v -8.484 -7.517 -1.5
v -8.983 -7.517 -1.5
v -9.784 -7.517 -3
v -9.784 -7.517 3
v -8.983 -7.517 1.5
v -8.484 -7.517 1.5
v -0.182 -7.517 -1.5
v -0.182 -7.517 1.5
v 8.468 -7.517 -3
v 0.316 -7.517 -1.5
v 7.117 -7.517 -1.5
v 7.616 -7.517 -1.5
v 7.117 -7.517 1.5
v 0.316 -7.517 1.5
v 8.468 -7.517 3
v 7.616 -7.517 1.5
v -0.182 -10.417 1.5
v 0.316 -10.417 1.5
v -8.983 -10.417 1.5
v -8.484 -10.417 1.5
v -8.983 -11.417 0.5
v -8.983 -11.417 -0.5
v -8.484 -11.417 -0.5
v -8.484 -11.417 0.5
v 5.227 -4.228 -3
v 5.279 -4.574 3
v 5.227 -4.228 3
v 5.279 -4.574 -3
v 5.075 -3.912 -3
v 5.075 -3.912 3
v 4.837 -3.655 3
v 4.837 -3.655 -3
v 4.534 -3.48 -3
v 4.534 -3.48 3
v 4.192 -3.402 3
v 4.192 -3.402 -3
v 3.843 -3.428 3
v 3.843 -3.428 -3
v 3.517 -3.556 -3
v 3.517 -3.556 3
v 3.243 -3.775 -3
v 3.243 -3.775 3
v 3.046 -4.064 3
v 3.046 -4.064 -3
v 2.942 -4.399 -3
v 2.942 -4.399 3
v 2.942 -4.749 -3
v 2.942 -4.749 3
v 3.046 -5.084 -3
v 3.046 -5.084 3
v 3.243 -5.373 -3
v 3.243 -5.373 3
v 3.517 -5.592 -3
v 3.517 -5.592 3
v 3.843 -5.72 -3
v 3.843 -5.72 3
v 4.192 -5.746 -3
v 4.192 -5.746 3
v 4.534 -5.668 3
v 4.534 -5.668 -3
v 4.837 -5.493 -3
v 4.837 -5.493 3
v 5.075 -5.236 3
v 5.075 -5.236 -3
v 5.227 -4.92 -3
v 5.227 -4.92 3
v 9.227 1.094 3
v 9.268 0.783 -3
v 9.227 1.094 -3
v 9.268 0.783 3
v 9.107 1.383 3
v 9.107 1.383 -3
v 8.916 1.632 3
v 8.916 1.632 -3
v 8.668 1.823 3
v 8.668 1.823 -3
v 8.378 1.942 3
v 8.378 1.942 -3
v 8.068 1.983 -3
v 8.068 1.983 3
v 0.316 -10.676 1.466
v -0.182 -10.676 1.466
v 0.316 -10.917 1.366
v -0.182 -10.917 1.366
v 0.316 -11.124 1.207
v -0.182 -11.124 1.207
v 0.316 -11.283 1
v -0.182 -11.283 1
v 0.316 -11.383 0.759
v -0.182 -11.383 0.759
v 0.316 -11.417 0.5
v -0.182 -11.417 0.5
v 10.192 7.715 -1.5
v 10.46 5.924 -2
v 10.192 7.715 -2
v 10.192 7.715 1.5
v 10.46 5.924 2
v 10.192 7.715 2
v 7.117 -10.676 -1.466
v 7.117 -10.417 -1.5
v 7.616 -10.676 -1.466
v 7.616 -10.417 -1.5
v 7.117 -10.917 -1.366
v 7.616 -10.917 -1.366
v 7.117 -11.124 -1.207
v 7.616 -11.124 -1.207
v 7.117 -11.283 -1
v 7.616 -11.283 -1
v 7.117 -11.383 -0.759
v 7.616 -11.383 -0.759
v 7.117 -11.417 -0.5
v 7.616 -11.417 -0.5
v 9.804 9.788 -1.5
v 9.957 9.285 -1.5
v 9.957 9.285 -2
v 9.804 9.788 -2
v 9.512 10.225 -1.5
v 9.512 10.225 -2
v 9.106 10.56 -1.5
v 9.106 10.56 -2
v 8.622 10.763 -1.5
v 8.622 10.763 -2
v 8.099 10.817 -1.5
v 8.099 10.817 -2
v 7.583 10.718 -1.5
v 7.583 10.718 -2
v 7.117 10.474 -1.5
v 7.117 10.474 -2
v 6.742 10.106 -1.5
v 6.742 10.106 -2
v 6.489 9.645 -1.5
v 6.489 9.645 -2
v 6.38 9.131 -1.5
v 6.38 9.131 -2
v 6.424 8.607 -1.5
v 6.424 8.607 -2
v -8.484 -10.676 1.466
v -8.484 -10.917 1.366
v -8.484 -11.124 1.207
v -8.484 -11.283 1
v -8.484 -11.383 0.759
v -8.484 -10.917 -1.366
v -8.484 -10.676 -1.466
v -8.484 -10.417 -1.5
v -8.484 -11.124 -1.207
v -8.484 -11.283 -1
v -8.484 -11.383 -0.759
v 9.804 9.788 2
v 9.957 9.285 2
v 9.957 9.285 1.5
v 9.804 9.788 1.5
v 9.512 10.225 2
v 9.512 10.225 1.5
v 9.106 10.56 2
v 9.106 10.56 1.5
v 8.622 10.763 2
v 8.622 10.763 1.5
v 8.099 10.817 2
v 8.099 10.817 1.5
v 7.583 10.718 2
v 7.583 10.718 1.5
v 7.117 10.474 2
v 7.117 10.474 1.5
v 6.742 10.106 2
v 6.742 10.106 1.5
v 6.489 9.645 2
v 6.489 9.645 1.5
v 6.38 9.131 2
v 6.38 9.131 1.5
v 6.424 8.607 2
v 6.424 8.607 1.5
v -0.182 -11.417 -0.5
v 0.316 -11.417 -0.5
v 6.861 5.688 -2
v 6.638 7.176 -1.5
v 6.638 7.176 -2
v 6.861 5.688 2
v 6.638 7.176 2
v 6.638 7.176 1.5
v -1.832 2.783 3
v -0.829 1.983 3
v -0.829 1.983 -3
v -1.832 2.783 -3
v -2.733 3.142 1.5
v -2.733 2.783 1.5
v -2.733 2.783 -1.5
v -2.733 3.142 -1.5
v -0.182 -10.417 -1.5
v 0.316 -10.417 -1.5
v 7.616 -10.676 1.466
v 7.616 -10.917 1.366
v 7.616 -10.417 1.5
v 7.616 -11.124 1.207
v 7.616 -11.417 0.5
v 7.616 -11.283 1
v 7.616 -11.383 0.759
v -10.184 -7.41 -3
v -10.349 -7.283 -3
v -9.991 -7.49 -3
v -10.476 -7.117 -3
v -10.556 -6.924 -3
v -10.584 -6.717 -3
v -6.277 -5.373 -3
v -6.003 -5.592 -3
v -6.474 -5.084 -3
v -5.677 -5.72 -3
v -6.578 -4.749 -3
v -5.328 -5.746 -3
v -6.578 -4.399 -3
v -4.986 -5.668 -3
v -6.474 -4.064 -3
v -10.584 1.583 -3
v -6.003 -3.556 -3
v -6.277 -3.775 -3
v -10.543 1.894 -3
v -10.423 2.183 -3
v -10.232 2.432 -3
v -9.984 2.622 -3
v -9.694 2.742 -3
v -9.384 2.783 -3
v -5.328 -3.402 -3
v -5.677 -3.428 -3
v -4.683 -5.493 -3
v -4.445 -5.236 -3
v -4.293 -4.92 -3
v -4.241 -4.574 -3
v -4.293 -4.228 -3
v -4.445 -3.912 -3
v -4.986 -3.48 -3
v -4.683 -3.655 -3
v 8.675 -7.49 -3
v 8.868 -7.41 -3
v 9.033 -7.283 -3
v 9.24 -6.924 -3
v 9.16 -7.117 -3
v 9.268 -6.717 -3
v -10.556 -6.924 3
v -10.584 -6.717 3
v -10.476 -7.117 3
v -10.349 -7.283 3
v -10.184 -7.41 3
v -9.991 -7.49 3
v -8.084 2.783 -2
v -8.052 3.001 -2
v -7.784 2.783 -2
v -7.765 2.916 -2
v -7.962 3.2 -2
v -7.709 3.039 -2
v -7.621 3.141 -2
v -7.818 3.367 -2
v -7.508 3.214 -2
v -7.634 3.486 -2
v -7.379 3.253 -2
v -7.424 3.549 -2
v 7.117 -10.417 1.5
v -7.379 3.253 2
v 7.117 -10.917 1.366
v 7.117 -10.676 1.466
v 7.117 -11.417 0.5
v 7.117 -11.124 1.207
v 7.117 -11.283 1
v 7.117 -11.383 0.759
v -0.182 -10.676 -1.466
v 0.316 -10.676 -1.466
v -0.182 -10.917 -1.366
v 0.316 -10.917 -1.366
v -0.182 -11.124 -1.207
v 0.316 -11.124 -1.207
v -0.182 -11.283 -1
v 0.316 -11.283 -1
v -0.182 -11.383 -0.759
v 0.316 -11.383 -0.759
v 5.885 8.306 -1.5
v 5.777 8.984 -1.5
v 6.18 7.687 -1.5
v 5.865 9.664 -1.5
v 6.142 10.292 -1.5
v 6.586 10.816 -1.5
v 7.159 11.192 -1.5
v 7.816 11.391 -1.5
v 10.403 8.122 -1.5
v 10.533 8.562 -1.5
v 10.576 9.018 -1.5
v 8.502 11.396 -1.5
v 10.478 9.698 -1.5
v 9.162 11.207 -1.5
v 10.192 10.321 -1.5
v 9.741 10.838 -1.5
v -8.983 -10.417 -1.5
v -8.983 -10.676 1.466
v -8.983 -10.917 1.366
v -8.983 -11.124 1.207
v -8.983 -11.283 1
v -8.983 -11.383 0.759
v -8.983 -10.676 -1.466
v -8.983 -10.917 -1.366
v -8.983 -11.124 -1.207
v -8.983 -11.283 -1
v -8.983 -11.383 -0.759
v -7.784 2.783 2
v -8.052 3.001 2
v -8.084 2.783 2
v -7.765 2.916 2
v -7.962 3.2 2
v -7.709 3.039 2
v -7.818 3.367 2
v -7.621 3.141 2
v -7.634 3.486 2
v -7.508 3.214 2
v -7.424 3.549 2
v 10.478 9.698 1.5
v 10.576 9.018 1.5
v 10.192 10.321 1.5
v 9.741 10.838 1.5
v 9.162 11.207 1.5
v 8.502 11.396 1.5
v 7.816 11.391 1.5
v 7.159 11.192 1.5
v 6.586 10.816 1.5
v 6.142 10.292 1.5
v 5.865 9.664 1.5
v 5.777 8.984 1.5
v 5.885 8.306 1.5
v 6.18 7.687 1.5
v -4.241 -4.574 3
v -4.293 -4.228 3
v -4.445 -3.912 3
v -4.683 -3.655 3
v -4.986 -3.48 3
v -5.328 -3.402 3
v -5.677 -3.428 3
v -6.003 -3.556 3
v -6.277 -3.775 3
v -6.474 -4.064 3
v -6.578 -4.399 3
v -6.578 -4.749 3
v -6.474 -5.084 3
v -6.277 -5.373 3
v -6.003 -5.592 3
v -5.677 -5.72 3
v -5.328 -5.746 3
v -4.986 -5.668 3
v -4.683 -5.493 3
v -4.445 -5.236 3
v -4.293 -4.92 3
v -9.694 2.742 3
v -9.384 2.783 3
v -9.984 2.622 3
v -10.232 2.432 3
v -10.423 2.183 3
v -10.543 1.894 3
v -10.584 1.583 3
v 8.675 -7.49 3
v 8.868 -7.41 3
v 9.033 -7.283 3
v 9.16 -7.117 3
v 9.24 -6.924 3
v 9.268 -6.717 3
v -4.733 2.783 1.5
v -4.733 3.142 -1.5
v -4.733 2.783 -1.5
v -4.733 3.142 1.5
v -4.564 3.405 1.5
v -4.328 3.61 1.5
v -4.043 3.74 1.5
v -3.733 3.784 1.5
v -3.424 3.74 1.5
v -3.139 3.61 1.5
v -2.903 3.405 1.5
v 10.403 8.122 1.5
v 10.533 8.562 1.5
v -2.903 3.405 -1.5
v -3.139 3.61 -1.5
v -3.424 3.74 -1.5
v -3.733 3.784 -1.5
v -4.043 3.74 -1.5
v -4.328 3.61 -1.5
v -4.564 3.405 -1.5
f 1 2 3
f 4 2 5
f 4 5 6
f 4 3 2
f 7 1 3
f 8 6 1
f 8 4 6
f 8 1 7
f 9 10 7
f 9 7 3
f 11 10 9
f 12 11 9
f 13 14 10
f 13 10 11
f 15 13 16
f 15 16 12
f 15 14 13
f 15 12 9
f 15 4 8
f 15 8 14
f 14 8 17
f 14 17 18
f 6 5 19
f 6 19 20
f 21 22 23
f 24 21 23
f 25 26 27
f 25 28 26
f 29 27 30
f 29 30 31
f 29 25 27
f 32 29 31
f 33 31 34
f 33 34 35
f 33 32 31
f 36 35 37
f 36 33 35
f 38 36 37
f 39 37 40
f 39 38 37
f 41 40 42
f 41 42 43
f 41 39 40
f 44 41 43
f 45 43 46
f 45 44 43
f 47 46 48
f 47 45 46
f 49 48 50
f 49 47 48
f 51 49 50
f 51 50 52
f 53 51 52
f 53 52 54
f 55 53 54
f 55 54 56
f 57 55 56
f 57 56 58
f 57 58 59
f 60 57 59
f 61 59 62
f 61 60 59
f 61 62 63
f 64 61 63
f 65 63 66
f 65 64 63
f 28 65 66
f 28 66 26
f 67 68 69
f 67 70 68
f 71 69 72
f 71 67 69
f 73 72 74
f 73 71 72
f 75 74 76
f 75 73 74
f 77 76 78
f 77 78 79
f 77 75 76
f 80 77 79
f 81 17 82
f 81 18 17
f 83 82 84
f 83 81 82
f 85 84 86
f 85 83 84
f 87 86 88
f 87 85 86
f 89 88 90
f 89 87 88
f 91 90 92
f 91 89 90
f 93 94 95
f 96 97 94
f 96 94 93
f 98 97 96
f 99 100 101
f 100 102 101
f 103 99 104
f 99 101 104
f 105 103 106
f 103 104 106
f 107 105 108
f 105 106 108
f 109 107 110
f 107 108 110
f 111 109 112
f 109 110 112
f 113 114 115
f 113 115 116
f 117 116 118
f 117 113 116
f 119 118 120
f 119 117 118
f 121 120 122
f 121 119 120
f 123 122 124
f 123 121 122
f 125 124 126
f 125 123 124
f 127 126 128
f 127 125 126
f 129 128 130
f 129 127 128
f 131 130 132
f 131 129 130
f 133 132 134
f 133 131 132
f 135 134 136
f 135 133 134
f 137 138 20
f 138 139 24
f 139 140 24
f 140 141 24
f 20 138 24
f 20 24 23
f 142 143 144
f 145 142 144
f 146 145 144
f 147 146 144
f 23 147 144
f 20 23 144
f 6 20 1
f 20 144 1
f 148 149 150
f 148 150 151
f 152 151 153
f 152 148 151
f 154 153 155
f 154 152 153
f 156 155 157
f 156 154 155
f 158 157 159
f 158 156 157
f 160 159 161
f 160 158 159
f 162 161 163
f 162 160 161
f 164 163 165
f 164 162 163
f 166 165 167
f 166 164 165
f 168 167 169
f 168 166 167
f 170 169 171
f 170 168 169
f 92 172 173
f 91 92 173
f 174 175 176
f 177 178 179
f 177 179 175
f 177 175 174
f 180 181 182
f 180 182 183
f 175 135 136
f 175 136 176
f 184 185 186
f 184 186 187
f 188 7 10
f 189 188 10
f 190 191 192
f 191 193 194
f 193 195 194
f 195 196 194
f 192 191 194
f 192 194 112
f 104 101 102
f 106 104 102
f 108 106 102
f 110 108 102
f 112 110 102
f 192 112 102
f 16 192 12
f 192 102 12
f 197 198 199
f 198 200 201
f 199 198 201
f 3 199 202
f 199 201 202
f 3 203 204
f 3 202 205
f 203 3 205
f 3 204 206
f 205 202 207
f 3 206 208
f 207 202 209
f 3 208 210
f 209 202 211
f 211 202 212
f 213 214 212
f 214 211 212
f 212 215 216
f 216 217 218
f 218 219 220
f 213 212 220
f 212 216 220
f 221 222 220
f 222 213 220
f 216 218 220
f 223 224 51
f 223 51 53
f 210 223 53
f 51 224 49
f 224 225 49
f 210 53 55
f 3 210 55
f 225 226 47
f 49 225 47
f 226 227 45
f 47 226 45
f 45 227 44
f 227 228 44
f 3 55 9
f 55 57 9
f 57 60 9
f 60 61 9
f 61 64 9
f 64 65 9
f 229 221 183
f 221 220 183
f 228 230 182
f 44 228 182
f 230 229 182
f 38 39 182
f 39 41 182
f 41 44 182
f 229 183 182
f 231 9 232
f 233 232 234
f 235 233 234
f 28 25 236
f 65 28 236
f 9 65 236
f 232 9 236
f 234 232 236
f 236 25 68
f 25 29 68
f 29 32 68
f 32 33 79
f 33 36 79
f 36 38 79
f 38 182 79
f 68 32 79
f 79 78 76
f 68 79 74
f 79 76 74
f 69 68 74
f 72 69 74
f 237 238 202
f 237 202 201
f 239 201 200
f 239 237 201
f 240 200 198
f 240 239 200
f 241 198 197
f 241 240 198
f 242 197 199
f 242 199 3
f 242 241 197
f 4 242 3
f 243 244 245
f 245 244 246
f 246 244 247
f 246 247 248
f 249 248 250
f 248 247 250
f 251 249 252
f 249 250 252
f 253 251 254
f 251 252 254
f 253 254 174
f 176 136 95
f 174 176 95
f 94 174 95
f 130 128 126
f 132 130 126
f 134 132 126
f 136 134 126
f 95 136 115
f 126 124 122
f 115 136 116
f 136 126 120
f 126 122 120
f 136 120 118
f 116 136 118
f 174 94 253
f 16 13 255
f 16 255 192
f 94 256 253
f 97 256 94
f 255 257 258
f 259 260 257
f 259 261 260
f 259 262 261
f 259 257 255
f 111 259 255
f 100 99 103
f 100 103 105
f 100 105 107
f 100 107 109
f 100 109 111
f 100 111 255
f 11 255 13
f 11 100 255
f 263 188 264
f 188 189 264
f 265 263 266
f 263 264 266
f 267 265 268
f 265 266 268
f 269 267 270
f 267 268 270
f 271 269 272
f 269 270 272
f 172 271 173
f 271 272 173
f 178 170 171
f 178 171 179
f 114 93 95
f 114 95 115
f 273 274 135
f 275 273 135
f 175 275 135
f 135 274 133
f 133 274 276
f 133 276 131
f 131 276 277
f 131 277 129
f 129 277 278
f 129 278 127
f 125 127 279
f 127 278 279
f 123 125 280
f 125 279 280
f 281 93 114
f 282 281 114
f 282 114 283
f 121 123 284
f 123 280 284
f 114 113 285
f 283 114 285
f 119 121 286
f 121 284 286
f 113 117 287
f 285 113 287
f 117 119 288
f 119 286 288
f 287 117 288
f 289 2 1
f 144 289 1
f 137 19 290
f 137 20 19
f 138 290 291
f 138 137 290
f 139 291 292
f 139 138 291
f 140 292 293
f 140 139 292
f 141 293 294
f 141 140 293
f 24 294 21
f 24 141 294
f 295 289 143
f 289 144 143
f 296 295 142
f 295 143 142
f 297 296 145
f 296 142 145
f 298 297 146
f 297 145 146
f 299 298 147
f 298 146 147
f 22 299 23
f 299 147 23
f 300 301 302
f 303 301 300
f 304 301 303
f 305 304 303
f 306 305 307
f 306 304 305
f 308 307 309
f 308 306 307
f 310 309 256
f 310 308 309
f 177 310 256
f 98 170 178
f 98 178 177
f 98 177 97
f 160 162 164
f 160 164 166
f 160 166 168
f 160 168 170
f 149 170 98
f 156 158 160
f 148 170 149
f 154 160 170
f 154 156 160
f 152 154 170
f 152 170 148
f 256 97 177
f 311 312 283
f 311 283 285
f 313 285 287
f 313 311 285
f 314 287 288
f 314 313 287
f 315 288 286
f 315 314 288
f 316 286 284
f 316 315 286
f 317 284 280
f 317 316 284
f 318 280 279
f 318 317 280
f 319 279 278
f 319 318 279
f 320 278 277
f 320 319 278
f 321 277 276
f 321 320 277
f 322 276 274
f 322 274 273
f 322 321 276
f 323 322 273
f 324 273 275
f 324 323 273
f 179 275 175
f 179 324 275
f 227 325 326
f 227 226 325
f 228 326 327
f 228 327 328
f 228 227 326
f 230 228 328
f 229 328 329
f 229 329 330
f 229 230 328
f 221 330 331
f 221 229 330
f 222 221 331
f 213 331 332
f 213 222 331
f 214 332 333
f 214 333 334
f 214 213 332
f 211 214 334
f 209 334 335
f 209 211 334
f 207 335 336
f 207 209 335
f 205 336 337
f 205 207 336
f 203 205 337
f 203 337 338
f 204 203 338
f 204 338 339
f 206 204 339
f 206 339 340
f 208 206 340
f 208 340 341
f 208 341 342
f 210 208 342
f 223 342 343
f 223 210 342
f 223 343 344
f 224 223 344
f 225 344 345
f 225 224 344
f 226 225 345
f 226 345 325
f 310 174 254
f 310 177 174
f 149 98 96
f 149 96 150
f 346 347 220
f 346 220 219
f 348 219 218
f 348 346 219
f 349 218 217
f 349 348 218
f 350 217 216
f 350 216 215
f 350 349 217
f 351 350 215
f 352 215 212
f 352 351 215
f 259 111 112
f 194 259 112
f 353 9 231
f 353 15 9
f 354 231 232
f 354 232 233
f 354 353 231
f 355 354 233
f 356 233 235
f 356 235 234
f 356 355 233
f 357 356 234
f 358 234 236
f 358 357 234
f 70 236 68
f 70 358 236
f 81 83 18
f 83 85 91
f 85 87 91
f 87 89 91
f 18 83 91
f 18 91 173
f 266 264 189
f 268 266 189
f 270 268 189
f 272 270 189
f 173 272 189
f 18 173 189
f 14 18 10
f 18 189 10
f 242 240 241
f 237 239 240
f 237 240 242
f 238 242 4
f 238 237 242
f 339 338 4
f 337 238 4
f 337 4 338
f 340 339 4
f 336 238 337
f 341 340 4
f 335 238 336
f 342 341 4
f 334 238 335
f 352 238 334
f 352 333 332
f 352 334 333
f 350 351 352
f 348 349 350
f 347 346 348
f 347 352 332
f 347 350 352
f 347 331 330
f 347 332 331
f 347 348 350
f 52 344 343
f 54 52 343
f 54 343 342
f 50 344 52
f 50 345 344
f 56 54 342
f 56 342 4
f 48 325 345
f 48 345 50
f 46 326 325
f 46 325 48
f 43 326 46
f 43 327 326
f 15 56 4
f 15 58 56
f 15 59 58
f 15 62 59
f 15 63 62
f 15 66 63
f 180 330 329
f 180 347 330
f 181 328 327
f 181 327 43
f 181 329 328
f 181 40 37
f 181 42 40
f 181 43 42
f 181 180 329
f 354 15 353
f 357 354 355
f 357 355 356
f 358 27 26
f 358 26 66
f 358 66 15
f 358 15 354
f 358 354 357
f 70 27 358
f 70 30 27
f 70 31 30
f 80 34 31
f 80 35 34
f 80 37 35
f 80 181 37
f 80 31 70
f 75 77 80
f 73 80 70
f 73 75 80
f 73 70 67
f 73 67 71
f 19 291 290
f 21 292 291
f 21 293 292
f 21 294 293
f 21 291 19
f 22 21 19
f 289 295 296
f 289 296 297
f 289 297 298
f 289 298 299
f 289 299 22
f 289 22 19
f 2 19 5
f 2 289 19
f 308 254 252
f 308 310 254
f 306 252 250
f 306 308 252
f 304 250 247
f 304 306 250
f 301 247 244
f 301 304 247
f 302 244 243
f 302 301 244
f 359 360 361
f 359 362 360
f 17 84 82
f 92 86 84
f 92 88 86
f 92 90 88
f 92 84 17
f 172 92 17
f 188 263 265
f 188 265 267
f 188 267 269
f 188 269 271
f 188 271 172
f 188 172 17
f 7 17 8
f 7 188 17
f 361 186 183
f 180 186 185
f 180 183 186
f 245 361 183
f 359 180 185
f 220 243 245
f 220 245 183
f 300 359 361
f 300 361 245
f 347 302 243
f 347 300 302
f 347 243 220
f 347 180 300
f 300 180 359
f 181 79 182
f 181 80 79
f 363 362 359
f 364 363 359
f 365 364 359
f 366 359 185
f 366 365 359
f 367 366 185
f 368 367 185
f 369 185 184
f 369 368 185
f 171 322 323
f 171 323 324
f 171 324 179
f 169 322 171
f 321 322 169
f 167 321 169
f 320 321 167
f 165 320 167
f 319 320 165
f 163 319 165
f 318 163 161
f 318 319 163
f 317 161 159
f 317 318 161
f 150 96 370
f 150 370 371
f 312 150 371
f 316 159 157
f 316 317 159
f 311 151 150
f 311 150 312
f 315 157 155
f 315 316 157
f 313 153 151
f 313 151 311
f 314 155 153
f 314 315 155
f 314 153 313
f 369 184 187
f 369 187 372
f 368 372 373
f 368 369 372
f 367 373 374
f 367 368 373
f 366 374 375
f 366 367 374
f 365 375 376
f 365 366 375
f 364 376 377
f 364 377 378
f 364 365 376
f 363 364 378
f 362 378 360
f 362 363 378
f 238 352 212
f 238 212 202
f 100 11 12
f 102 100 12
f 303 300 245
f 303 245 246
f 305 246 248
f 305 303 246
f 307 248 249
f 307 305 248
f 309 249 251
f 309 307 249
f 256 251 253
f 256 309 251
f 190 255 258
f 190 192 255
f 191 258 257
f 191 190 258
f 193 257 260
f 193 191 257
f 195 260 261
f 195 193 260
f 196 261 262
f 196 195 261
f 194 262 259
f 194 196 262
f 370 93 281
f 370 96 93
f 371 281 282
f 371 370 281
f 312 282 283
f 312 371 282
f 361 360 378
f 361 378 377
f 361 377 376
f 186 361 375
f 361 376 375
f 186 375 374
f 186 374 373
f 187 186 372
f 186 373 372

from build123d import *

# Parameters (mm, degrees)
F0_R     = 1.486134
F1_DEPTH = 1.5
F2_DEPTH = 2
F0_R_2   = 1.175
F3_DEPTH = 3
F0_W     = 0.498902
F0_H     = 3.899722
F0_W_2   = 0.498903
F4_DEPTH = 1.5
F5_R     = 1


with BuildPart() as f1:
    # F0 (on Top) → F1 (new body, symmetric)
    with BuildSketch(Plane.XY):
        with BuildLine():
            Line((9.956507, 9.285055), (10.191603, 7.715109))
            ThreePointArc((10.191603, 7.715109), (10.478158, 8.338993), (10.576356, 9.018481))
            ThreePointArc((10.576356, 9.018481), (7.15933, 11.192339), (6.638307, 7.17609))
            Line((6.638307, 7.17609), (6.424053, 8.606856))
            ThreePointArc((6.424053, 8.606856), (7.83697, 10.786197), (9.956507, 9.285055))
        make_face()
        with BuildLine():
            ThreePointArc((6.638307, 7.17609), (8.536307, 6.645627), (10.191603, 7.715109))
            Line((10.191603, 7.715109), (9.956507, 9.285055))
            ThreePointArc((9.956507, 9.285055), (7.83697, 10.786197), (6.424053, 8.606856))
            Line((6.424053, 8.606856), (6.638307, 7.17609))
        make_face()
        with Locations((8.176356, 9.018481)):
            Circle(F0_R, mode=Mode.SUBTRACT)
    extrude(amount=F1_DEPTH, both=True)

    # F0 (on Top) → F2 (join, symmetric)
    with BuildSketch(Plane.XY):
        with BuildLine():
            Line((-8.083594, 2.783208), (-7.783598, 2.783208))
            ThreePointArc((-7.783598, 2.783208), (-7.668552, 3.092999), (-7.379205, 3.252638))
            Line((-7.379205, 3.252638), (10.459818, 5.923991))
            Line((10.459818, 5.923991), (10.191603, 7.715109))
            ThreePointArc((10.191603, 7.715109), (8.536307, 6.645627), (6.638307, 7.17609))
            Line((6.638307, 7.17609), (6.861082, 5.688423))
            Line((6.861082, 5.688423), (-7.423694, 3.549311))
            ThreePointArc((-7.423694, 3.549311), (-7.895881, 3.288779), (-8.083594, 2.783208))
        make_face()
        with BuildLine():
            ThreePointArc((6.638307, 7.17609), (8.536307, 6.645627), (10.191603, 7.715109))
            Line((10.191603, 7.715109), (9.956507, 9.285055))
            ThreePointArc((9.956507, 9.285055), (7.83697, 10.786197), (6.424053, 8.606856))
            Line((6.424053, 8.606856), (6.638307, 7.17609))
        make_face()
        with Locations((8.176356, 9.018481)):
            Circle(F0_R, mode=Mode.SUBTRACT)
        with Locations((8.176356, 9.018481)):
            Circle(F0_R)
    extrude(amount=F2_DEPTH, both=True)

    # F0 (on Top) → F3 (join, symmetric)
    with BuildSketch(Plane.XY):
        with BuildLine():
            Line((8.067619, 1.983345), (-0.828579, 1.983345))
            Line((-0.828579, 1.983345), (-1.832268, 2.783208))
            Line((-1.832268, 2.783208), (-2.733431, 2.783208))
            Line((-2.733431, 2.783208), (-4.733298, 2.783208))
            Line((-4.733298, 2.783208), (-7.783598, 2.783208))
            Line((-7.783598, 2.783208), (-8.083594, 2.783208))
            Line((-8.083594, 2.783208), (-9.383528, 2.783208))
            ThreePointArc((-9.383528, 2.783208), (-10.232056, 2.431737), (-10.583528, 1.583208))
            Line((-10.583528, 1.583208), (-10.583528, -6.717112))
            ThreePointArc((-10.583528, -6.717112), (-10.349214, -7.282798), (-9.783528, -7.517112))
            Line((-9.783528, -7.517112), (-8.983085, -7.517112))
            Line((-8.983085, -7.517112), (-8.484182, -7.517112))
            Line((-8.484182, -7.517112), (-0.182472, -7.517112))
            Line((-0.182472, -7.517112), (0.316431, -7.517112))
            Line((0.316431, -7.517112), (7.116681, -7.517112))
            Line((7.116681, -7.517112), (7.615583, -7.517112))
            Line((7.615583, -7.517112), (8.467619, -7.517112))
            ThreePointArc((8.467619, -7.517112), (9.033304, -7.282798), (9.267619, -6.717112))
            Line((9.267619, -6.717112), (9.267619, 0.783345))
            ThreePointArc((9.267619, 0.783345), (8.916147, 1.631874), (8.067619, 1.983345))
        make_face()
        with Locations((-5.415644, -4.574013)):
            Circle(F0_R_2, mode=Mode.SUBTRACT)
        with Locations((4.104344, -4.574013)):
            Circle(F0_R_2, mode=Mode.SUBTRACT)
    extrude(amount=F3_DEPTH, both=True)

    # F0 (on Top) → F4 (join, symmetric)
    with BuildSketch(Plane.XY):
        with Locations((7.366132, -9.466973)):
            Rectangle(F0_W, F0_H)
        with Locations((0.066979, -9.466973)):
            Rectangle(F0_W_2, F0_H)
        with Locations((-8.733633, -9.466973)):
            Rectangle(F0_W_2, F0_H)
        with BuildLine():
            Line((-4.733298, 2.783208), (-2.733431, 2.783208))
            Line((-2.733431, 2.783208), (-2.733431, 3.142395))
            ThreePointArc((-2.733431, 3.142395), (-3.733365, 3.784402), (-4.733298, 3.142395))
            Line((-4.733298, 3.142395), (-4.733298, 2.783208))
        make_face()
    extrude(amount=F4_DEPTH, both=True)

    # F5
    f5_edges = [f1.edges().sort_by_distance(p)[0] for p in [
        (-8.733634, -11.416834, 1.5),
        (0.066979, -11.416834, 1.5),
        (7.366132, -11.416834, 1.5),
        (7.366132, -11.416834, -1.5),
        (0.066979, -11.416834, -1.5),
        (-8.733634, -11.416834, -1.5),
    ]]
    fillet(f5_edges, radius=F5_R)


solid = f1.part
